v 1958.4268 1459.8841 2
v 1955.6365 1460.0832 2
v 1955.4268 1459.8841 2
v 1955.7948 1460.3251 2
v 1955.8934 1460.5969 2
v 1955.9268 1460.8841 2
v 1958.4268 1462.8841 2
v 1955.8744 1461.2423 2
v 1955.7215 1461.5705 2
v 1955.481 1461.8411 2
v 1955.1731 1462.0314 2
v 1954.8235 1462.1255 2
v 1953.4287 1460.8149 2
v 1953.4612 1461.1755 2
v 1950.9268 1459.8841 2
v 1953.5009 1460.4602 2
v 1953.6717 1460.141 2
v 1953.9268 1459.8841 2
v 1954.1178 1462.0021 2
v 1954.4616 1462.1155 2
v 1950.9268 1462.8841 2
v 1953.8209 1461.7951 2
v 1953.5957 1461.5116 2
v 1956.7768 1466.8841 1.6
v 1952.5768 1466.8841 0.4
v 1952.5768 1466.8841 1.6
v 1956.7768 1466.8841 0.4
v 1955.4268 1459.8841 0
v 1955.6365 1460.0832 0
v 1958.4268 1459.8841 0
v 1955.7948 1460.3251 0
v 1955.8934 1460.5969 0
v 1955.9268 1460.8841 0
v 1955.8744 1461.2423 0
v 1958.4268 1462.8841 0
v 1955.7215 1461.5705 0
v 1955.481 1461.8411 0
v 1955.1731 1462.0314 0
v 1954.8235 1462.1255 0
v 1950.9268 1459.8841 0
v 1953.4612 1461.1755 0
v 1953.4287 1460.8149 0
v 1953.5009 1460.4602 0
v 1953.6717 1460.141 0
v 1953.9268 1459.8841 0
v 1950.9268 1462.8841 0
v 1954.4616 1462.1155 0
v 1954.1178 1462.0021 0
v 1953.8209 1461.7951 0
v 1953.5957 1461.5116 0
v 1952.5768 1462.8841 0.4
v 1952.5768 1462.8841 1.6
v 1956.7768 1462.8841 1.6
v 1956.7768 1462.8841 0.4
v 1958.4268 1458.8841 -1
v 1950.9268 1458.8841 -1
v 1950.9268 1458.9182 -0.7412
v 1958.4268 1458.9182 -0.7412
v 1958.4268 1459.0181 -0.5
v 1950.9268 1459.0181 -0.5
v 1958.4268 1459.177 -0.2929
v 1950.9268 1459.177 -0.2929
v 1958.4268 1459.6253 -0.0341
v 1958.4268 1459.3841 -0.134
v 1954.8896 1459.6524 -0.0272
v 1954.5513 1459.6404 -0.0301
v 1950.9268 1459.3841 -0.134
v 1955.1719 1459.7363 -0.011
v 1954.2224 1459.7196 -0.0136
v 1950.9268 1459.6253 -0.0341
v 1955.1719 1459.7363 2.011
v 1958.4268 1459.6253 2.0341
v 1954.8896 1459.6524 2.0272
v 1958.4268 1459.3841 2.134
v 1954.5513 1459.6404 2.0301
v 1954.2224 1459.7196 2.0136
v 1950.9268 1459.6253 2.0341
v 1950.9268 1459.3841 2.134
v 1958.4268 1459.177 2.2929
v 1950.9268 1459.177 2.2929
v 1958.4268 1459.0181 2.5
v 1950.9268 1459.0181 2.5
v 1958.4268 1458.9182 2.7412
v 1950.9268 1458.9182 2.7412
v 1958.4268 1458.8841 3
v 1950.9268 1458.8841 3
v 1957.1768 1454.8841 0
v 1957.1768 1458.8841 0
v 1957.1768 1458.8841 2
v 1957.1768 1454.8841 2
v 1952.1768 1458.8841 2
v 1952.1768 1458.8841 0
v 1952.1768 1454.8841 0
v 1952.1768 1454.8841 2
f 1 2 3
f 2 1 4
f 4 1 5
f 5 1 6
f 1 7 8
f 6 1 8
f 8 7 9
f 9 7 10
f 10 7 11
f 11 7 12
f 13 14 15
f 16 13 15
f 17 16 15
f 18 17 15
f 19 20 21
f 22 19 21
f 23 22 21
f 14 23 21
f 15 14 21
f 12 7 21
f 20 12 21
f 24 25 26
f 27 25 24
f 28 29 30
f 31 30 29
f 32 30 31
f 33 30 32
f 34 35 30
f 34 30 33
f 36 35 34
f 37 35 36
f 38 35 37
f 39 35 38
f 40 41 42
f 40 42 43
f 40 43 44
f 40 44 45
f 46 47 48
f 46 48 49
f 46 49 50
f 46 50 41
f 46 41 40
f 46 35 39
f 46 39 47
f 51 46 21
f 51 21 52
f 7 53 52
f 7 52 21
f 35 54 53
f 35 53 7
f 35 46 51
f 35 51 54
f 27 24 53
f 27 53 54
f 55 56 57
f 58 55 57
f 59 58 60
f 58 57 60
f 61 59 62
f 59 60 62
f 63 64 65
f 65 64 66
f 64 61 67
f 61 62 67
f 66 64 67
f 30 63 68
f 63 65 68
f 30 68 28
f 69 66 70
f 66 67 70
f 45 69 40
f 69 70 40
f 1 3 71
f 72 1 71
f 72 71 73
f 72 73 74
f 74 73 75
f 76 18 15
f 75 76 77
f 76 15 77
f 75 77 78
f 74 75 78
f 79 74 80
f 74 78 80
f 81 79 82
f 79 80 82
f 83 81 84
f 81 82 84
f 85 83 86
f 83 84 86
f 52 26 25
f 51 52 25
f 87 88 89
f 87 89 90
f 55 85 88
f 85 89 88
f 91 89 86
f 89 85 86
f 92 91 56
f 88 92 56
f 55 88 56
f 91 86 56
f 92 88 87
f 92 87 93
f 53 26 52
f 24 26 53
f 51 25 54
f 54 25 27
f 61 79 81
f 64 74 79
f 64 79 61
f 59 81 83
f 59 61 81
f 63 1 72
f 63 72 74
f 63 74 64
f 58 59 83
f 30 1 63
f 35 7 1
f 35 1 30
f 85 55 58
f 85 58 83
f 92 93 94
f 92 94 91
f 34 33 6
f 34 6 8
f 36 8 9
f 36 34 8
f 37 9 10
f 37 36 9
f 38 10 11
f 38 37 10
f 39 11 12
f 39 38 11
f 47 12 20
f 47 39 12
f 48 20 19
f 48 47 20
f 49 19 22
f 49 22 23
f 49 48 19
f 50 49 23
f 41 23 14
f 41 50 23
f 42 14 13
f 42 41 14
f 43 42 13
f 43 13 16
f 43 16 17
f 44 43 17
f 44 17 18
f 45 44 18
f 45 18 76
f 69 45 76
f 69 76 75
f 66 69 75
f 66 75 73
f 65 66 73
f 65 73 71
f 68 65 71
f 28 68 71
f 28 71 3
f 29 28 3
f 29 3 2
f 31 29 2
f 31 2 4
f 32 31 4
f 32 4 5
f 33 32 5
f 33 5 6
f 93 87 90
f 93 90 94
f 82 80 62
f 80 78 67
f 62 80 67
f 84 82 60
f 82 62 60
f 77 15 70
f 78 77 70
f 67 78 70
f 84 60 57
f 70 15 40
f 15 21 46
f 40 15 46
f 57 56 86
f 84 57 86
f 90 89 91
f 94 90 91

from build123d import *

# Parameters (mm, degrees)
SKETCH1_R               = 1.25
BOSS_EXTRUDE1_DEPTH     = 2
BOSS_EXTRUDE2_DEPTH     = 7.5
SKETCH3_R               = 1.25
CUT_EXTRUDE1_DEPTH      = 2
CUT_EXTRUDE1_DEPTH_BACK = 4
SKETCH4_W               = 5
SKETCH4_H               = 2
SKETCH4_W_2             = 4.2
SKETCH4_H_2             = 1.2
CUT_EXTRUDE2_DEPTH      = 4


with BuildPart() as part:
    # Sketch1 → Boss-Extrude1 (new body)
    with BuildSketch(Plane.XY):
        Polygon((1952.176808721, 1466.884115951), (1957.176808721, 1466.884115951), (1957.176808721, 1462.884115951), (1958.426808721, 1462.884115951), (1958.426808721, 1458.884115951), (1957.176808721, 1458.884115951), (1957.176808721, 1454.884115951), (1952.176808721, 1454.884115951), (1952.176808721, 1458.884115951), (1950.926808721, 1458.884115951), (1950.926808721, 1462.884115951), (1952.176808721, 1462.884115951), align=None)
        with Locations((1954.676808721, 1460.884115951)):
            Circle(SKETCH1_R, mode=Mode.SUBTRACT)
    extrude(amount=BOSS_EXTRUDE1_DEPTH)

    # Sketch2 → Boss-Extrude2 (add)
    with BuildSketch(Plane.ZY.offset(-1950.926808721)):
        with BuildLine():
            Line((2, 1458.884115951), (2, 1459.884115951))
            ThreePointArc((2, 1459.884115951), (2.292893219, 1459.17700917), (3, 1458.884115951))
            Line((3, 1458.884115951), (2, 1458.884115951))
        make_face()
        with BuildLine():
            Line((0, 1458.884115951), (-1, 1458.884115951))
            ThreePointArc((-1, 1458.884115951), (-0.292893219, 1459.17700917), (0, 1459.884115951))
            Line((0, 1459.884115951), (0, 1458.884115951))
        make_face()
    extrude(amount=-BOSS_EXTRUDE2_DEPTH)

    # Sketch3 → Cut-Extrude1 (cut, two sides)
    with BuildSketch(Plane.XY.offset(2)) as cut_extrude1_sk:
        with Locations((1954.676808721, 1460.884115951)):
            Circle(SKETCH3_R)
    extrude(amount=CUT_EXTRUDE1_DEPTH, mode=Mode.SUBTRACT)
    extrude(cut_extrude1_sk.sketch, amount=-CUT_EXTRUDE1_DEPTH_BACK, mode=Mode.SUBTRACT)

    # Sketch4 → Cut-Extrude2 (cut)
    with BuildSketch(Plane(origin=(0, 1466.884115951, 0), x_dir=(1, 0, 0), z_dir=(0, 1, 0))):
        with Locations((1954.676808721, -1)):
            Rectangle(SKETCH4_W, SKETCH4_H)
        with Locations((1954.676808721, -1)):
            Rectangle(SKETCH4_W_2, SKETCH4_H_2, mode=Mode.SUBTRACT)
    extrude(amount=-CUT_EXTRUDE2_DEPTH, mode=Mode.SUBTRACT)


solid = part.part
